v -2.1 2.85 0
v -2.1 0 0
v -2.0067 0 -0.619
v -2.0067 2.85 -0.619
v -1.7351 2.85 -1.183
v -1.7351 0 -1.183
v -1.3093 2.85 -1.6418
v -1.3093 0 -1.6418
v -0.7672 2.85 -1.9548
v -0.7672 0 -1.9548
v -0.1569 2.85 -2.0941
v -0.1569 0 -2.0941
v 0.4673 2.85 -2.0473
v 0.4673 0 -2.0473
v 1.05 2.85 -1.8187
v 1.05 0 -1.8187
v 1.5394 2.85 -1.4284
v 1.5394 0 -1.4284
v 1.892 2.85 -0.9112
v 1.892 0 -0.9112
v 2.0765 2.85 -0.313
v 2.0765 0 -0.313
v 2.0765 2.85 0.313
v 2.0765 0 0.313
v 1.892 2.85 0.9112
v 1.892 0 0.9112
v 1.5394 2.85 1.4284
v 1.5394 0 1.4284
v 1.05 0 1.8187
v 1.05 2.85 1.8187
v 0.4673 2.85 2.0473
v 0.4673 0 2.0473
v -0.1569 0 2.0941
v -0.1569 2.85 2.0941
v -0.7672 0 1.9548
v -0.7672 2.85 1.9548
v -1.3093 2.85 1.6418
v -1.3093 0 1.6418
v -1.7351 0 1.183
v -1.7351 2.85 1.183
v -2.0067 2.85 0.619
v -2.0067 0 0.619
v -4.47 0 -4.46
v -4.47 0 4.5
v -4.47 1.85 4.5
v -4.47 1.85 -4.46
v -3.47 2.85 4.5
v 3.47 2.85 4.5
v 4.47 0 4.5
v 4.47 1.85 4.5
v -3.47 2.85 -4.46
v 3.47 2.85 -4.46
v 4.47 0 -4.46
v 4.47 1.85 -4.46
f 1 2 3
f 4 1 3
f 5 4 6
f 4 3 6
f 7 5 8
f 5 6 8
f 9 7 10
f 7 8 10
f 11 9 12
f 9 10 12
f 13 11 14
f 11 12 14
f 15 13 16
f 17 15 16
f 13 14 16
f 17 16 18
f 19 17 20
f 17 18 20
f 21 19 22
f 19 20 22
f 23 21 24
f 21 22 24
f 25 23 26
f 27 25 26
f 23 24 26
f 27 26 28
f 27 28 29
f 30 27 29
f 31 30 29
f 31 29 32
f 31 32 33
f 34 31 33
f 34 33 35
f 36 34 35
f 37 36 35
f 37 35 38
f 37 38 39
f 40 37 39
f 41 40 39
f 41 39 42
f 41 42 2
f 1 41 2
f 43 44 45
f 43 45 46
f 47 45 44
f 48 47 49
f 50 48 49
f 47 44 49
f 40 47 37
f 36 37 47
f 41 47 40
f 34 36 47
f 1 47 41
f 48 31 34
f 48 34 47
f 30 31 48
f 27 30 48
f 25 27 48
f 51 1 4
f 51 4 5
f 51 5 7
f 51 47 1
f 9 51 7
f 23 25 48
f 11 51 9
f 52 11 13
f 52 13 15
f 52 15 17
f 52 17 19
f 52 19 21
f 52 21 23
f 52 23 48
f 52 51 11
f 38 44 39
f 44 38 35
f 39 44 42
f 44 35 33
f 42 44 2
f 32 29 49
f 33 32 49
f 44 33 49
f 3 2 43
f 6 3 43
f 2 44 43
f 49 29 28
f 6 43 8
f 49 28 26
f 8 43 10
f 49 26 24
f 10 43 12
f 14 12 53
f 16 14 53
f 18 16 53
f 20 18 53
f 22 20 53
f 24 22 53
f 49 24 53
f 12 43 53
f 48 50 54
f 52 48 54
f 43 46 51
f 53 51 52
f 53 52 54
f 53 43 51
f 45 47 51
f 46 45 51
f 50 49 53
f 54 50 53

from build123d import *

# Parameters (mm, degrees)
SKETCH1_W                 = 8.94
SKETCH1_H                 = 8.96
EXTRUDE1_DEPTH            = 2.85
M5X0_8_TAPPED_HOLE1_D     = 4.2
M5X0_8_TAPPED_HOLE1_DEPTH = 12.4
M5X0_8_TAPPED_HOLE1_TIP   = 1.2618073
CHAMFER1_SIZE             = 1


with BuildPart() as part:
    # Sketch1 → Extrude1 (new body)
    with BuildSketch(Plane(origin=(0, 0, 0), x_dir=(1, 0, 0), z_dir=(0, 1, 0))):
        with Locations((0, -0.02)):
            Rectangle(SKETCH1_W, SKETCH1_H)
    extrude(amount=EXTRUDE1_DEPTH)

    # M5x0.8 Tapped Hole1
    with Locations(Plane(origin=(0, 2.85, 0), x_dir=(1, 0, 0), z_dir=(0, 1, 0))):
        with Locations((0, 0)):
            Hole(M5X0_8_TAPPED_HOLE1_D / 2, depth=M5X0_8_TAPPED_HOLE1_DEPTH)
            with Locations((0, 0, -(M5X0_8_TAPPED_HOLE1_DEPTH + M5X0_8_TAPPED_HOLE1_TIP / 2))):  # 118° drill point
                Cone(0, M5X0_8_TAPPED_HOLE1_D / 2, M5X0_8_TAPPED_HOLE1_TIP, mode=Mode.SUBTRACT)

    # Chamfer1
    chamfer1_edges = [part.edges().sort_by_distance(p)[0] for p in [
        (4.47, 2.85, 0.02),
        (-4.47, 2.85, 0.02),
    ]]
    chamfer(chamfer1_edges, length=CHAMFER1_SIZE)


solid = part.part
